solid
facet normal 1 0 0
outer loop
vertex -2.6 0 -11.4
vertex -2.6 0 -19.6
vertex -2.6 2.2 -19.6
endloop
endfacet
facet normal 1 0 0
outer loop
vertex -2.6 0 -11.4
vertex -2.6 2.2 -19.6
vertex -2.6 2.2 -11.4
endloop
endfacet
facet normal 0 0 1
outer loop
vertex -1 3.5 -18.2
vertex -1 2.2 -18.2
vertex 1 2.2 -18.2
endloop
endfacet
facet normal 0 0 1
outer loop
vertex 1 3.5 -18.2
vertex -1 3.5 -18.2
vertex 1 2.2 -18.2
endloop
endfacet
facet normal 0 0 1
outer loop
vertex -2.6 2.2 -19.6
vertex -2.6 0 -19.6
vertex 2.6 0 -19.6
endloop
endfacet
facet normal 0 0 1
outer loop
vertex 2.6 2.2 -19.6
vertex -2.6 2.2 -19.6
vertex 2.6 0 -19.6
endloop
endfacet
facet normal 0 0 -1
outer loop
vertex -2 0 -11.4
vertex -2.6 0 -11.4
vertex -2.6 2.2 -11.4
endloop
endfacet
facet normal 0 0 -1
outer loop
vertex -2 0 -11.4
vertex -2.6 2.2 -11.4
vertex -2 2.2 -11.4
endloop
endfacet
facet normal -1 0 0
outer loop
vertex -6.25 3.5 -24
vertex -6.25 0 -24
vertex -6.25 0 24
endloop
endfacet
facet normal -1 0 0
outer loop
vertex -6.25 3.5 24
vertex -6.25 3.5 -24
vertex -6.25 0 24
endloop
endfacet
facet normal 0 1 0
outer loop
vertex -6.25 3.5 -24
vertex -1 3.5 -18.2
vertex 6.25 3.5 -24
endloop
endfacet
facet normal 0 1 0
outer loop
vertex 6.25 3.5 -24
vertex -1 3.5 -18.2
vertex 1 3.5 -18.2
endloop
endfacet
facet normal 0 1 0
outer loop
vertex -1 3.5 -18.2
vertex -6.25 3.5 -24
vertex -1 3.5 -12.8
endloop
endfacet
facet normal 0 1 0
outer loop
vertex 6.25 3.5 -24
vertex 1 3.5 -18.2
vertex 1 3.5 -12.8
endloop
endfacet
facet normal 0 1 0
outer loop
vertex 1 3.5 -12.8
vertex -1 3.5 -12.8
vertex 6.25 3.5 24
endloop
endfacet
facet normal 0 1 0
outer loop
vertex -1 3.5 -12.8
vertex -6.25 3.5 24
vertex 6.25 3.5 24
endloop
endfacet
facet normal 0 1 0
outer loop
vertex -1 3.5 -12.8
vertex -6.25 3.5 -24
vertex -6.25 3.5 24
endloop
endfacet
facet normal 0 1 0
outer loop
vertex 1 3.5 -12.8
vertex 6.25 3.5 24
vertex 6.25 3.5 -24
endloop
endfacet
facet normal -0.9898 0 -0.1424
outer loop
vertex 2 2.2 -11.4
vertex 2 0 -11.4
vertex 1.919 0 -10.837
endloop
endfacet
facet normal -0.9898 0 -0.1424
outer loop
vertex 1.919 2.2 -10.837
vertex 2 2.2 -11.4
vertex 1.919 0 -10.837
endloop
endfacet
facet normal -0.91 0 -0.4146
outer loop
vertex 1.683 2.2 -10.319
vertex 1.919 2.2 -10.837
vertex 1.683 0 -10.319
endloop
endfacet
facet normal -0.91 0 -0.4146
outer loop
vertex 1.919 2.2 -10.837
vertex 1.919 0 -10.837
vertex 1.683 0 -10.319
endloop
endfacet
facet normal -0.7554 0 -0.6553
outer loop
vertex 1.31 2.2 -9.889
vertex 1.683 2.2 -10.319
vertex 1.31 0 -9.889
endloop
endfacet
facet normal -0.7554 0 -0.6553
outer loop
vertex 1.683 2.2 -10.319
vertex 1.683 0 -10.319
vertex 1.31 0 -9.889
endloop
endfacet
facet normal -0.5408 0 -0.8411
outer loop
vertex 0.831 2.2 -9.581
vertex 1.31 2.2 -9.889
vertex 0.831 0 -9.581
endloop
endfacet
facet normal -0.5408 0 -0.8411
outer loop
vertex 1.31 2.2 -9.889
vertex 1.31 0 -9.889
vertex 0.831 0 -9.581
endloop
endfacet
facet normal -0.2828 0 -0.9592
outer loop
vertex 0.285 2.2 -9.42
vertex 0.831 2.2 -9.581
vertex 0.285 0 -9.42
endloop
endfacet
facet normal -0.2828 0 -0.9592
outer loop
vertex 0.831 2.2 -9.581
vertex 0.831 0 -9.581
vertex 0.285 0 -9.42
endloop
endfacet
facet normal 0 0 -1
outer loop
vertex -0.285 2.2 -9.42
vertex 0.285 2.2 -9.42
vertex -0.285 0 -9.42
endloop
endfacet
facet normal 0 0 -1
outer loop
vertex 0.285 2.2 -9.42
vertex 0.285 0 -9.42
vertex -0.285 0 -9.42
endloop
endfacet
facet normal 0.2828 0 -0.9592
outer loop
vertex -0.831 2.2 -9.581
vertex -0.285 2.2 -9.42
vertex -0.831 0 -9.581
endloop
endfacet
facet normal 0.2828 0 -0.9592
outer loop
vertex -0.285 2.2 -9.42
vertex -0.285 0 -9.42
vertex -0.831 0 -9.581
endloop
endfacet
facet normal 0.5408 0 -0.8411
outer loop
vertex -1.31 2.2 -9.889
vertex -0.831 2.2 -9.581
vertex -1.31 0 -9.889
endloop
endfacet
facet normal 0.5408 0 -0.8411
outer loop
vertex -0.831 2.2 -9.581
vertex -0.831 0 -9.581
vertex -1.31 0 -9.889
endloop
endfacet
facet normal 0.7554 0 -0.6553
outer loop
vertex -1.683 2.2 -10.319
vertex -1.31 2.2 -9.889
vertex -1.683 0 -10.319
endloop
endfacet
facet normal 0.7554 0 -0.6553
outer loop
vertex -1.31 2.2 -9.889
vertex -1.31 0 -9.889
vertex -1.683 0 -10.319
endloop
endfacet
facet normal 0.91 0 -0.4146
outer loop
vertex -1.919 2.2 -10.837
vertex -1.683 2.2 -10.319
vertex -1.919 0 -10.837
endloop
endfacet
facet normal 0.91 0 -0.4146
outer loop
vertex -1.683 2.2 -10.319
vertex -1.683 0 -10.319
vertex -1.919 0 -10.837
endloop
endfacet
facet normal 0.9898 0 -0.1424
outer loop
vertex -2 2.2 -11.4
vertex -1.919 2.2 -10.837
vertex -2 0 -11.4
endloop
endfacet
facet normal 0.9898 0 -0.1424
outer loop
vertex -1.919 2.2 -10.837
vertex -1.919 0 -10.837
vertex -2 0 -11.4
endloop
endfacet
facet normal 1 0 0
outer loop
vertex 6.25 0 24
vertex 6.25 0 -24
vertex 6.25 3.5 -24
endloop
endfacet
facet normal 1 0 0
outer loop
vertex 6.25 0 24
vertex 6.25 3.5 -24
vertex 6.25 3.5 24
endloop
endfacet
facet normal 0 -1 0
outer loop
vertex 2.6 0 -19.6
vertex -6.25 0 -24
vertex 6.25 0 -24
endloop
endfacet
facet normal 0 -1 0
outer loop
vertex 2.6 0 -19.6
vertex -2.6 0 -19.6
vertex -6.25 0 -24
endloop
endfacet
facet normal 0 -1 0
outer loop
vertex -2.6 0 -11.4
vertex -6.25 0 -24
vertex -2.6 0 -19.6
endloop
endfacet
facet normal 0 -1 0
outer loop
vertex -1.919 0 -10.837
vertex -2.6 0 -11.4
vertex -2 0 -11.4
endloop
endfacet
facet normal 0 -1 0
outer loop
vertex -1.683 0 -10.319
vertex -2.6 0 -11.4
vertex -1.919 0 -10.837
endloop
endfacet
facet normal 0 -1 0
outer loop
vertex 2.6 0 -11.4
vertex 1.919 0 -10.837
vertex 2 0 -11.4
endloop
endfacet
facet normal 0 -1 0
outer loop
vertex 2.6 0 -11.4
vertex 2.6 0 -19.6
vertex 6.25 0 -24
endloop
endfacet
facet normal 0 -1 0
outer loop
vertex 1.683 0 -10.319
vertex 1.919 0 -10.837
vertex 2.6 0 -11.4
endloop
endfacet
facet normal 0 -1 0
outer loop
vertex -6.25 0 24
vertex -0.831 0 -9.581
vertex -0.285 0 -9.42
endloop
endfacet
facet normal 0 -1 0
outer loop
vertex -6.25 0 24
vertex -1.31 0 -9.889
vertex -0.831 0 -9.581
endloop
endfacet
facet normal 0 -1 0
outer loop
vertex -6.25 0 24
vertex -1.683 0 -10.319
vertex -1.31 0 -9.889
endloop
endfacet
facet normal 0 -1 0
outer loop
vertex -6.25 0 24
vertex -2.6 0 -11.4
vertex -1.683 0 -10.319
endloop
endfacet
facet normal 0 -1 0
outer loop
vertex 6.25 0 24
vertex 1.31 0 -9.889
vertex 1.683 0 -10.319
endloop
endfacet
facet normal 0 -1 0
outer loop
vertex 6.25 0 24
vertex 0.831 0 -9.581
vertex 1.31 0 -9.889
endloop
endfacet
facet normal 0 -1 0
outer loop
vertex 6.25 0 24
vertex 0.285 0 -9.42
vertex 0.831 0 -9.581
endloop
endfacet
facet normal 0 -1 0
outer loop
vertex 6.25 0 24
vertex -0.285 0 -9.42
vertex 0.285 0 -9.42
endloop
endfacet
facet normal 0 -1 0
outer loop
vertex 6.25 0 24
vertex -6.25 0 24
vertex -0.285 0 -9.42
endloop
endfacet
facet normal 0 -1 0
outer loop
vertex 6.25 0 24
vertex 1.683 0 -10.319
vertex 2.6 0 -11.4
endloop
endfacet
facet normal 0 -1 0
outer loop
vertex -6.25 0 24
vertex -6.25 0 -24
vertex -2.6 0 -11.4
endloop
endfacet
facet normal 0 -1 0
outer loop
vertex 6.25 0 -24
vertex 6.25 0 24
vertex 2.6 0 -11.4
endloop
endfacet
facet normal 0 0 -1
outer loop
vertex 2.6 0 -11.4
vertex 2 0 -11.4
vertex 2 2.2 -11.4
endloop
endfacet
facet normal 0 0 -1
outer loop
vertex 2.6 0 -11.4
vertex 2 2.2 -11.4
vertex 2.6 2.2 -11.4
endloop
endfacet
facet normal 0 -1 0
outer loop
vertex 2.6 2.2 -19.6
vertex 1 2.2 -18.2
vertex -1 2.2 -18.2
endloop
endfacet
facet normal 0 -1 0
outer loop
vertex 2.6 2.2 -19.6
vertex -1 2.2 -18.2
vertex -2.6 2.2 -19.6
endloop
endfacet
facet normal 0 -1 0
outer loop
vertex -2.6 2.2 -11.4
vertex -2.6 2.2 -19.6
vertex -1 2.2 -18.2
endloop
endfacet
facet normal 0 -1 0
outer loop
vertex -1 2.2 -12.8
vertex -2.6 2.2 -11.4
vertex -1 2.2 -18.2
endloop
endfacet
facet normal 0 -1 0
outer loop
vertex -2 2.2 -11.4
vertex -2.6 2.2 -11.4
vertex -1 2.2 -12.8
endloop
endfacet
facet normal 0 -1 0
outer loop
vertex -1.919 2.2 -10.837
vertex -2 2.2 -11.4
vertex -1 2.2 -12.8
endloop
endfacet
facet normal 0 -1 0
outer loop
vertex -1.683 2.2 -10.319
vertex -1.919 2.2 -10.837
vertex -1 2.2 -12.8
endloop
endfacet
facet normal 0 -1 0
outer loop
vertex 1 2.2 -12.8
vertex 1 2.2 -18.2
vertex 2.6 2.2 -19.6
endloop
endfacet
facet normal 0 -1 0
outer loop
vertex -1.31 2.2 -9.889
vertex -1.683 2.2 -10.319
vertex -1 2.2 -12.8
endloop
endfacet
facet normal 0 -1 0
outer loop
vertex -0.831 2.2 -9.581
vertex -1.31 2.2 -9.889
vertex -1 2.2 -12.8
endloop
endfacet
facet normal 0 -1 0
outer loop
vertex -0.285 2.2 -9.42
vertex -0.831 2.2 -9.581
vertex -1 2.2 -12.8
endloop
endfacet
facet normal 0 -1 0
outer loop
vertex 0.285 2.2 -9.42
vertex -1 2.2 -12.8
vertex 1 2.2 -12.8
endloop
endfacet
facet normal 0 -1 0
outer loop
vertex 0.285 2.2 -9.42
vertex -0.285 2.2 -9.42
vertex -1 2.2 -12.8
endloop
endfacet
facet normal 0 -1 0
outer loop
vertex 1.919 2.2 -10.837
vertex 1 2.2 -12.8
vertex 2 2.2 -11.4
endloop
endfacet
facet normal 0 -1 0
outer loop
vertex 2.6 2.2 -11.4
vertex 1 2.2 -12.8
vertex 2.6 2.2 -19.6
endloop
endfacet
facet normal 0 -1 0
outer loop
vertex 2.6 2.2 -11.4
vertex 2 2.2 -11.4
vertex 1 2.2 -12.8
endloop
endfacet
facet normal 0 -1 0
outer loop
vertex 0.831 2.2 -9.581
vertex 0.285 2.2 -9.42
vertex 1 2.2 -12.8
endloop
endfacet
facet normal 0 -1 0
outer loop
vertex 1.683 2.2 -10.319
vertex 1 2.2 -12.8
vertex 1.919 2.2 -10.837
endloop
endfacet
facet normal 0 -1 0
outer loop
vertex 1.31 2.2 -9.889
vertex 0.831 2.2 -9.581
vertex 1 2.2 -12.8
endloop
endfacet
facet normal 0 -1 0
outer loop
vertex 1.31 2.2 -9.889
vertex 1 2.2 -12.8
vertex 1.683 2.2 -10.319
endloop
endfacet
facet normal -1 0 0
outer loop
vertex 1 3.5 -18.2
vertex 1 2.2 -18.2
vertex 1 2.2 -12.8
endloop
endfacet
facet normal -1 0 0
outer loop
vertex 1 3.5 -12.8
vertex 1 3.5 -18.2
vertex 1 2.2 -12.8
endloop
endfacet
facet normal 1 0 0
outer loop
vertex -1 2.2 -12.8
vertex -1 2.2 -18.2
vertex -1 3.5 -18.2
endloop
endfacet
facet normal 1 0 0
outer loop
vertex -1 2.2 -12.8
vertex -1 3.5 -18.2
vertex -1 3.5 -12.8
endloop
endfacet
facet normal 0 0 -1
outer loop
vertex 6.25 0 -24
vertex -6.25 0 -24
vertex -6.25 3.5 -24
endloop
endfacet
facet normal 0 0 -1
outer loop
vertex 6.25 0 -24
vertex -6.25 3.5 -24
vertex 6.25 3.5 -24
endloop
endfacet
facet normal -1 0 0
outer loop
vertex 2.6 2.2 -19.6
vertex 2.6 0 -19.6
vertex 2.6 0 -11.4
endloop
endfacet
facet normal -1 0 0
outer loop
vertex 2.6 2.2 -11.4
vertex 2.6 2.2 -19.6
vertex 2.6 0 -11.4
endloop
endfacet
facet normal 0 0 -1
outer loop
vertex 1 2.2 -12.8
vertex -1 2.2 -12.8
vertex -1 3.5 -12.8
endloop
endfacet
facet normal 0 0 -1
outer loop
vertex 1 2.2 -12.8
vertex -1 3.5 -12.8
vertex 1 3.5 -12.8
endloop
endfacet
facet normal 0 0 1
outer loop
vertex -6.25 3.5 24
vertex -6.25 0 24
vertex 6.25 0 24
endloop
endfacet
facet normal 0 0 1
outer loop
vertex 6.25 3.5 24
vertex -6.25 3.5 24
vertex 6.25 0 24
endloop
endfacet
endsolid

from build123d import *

# Parameters (mm, degrees)
F0_W     = 12.5
F0_H     = 48
F1_DEPTH = 3.5
F2_W     = 5.2
F2_H     = 8.2
F3_DEPTH = 2.2
F4_W     = 2
F4_H     = 5.4
F5_DEPTH = 3.5
F6_R     = 2
F7_DEPTH = 2.2


# Not quite as in the source:
# - a feature names something its author has since deleted; it is built from what else it names


with BuildPart() as f1:
    # F0 (on Front) → F1 (new body)
    with BuildSketch(Plane.XZ):
        Rectangle(F0_W, F0_H)
    extrude(amount=-F1_DEPTH)

    # F2 (on Front) → F3 (cut)
    with BuildSketch(Plane.XZ):
        with Locations((0, -15.5)):
            Rectangle(F2_W, F2_H)
    extrude(amount=-F3_DEPTH, mode=Mode.SUBTRACT)

    # F4 (on Front) → F5 (cut)
    with BuildSketch(Plane.XZ):
        with Locations((0, -15.5)):
            Rectangle(F4_W, F4_H)
    extrude(amount=-F5_DEPTH, mode=Mode.SUBTRACT)

    # F6 (on Front) → F7 (cut)
    with BuildSketch(Plane.XZ):
        with Locations((0, -11.4)):
            Circle(F6_R)
    extrude(amount=-F7_DEPTH, mode=Mode.SUBTRACT)


solid = f1.part
